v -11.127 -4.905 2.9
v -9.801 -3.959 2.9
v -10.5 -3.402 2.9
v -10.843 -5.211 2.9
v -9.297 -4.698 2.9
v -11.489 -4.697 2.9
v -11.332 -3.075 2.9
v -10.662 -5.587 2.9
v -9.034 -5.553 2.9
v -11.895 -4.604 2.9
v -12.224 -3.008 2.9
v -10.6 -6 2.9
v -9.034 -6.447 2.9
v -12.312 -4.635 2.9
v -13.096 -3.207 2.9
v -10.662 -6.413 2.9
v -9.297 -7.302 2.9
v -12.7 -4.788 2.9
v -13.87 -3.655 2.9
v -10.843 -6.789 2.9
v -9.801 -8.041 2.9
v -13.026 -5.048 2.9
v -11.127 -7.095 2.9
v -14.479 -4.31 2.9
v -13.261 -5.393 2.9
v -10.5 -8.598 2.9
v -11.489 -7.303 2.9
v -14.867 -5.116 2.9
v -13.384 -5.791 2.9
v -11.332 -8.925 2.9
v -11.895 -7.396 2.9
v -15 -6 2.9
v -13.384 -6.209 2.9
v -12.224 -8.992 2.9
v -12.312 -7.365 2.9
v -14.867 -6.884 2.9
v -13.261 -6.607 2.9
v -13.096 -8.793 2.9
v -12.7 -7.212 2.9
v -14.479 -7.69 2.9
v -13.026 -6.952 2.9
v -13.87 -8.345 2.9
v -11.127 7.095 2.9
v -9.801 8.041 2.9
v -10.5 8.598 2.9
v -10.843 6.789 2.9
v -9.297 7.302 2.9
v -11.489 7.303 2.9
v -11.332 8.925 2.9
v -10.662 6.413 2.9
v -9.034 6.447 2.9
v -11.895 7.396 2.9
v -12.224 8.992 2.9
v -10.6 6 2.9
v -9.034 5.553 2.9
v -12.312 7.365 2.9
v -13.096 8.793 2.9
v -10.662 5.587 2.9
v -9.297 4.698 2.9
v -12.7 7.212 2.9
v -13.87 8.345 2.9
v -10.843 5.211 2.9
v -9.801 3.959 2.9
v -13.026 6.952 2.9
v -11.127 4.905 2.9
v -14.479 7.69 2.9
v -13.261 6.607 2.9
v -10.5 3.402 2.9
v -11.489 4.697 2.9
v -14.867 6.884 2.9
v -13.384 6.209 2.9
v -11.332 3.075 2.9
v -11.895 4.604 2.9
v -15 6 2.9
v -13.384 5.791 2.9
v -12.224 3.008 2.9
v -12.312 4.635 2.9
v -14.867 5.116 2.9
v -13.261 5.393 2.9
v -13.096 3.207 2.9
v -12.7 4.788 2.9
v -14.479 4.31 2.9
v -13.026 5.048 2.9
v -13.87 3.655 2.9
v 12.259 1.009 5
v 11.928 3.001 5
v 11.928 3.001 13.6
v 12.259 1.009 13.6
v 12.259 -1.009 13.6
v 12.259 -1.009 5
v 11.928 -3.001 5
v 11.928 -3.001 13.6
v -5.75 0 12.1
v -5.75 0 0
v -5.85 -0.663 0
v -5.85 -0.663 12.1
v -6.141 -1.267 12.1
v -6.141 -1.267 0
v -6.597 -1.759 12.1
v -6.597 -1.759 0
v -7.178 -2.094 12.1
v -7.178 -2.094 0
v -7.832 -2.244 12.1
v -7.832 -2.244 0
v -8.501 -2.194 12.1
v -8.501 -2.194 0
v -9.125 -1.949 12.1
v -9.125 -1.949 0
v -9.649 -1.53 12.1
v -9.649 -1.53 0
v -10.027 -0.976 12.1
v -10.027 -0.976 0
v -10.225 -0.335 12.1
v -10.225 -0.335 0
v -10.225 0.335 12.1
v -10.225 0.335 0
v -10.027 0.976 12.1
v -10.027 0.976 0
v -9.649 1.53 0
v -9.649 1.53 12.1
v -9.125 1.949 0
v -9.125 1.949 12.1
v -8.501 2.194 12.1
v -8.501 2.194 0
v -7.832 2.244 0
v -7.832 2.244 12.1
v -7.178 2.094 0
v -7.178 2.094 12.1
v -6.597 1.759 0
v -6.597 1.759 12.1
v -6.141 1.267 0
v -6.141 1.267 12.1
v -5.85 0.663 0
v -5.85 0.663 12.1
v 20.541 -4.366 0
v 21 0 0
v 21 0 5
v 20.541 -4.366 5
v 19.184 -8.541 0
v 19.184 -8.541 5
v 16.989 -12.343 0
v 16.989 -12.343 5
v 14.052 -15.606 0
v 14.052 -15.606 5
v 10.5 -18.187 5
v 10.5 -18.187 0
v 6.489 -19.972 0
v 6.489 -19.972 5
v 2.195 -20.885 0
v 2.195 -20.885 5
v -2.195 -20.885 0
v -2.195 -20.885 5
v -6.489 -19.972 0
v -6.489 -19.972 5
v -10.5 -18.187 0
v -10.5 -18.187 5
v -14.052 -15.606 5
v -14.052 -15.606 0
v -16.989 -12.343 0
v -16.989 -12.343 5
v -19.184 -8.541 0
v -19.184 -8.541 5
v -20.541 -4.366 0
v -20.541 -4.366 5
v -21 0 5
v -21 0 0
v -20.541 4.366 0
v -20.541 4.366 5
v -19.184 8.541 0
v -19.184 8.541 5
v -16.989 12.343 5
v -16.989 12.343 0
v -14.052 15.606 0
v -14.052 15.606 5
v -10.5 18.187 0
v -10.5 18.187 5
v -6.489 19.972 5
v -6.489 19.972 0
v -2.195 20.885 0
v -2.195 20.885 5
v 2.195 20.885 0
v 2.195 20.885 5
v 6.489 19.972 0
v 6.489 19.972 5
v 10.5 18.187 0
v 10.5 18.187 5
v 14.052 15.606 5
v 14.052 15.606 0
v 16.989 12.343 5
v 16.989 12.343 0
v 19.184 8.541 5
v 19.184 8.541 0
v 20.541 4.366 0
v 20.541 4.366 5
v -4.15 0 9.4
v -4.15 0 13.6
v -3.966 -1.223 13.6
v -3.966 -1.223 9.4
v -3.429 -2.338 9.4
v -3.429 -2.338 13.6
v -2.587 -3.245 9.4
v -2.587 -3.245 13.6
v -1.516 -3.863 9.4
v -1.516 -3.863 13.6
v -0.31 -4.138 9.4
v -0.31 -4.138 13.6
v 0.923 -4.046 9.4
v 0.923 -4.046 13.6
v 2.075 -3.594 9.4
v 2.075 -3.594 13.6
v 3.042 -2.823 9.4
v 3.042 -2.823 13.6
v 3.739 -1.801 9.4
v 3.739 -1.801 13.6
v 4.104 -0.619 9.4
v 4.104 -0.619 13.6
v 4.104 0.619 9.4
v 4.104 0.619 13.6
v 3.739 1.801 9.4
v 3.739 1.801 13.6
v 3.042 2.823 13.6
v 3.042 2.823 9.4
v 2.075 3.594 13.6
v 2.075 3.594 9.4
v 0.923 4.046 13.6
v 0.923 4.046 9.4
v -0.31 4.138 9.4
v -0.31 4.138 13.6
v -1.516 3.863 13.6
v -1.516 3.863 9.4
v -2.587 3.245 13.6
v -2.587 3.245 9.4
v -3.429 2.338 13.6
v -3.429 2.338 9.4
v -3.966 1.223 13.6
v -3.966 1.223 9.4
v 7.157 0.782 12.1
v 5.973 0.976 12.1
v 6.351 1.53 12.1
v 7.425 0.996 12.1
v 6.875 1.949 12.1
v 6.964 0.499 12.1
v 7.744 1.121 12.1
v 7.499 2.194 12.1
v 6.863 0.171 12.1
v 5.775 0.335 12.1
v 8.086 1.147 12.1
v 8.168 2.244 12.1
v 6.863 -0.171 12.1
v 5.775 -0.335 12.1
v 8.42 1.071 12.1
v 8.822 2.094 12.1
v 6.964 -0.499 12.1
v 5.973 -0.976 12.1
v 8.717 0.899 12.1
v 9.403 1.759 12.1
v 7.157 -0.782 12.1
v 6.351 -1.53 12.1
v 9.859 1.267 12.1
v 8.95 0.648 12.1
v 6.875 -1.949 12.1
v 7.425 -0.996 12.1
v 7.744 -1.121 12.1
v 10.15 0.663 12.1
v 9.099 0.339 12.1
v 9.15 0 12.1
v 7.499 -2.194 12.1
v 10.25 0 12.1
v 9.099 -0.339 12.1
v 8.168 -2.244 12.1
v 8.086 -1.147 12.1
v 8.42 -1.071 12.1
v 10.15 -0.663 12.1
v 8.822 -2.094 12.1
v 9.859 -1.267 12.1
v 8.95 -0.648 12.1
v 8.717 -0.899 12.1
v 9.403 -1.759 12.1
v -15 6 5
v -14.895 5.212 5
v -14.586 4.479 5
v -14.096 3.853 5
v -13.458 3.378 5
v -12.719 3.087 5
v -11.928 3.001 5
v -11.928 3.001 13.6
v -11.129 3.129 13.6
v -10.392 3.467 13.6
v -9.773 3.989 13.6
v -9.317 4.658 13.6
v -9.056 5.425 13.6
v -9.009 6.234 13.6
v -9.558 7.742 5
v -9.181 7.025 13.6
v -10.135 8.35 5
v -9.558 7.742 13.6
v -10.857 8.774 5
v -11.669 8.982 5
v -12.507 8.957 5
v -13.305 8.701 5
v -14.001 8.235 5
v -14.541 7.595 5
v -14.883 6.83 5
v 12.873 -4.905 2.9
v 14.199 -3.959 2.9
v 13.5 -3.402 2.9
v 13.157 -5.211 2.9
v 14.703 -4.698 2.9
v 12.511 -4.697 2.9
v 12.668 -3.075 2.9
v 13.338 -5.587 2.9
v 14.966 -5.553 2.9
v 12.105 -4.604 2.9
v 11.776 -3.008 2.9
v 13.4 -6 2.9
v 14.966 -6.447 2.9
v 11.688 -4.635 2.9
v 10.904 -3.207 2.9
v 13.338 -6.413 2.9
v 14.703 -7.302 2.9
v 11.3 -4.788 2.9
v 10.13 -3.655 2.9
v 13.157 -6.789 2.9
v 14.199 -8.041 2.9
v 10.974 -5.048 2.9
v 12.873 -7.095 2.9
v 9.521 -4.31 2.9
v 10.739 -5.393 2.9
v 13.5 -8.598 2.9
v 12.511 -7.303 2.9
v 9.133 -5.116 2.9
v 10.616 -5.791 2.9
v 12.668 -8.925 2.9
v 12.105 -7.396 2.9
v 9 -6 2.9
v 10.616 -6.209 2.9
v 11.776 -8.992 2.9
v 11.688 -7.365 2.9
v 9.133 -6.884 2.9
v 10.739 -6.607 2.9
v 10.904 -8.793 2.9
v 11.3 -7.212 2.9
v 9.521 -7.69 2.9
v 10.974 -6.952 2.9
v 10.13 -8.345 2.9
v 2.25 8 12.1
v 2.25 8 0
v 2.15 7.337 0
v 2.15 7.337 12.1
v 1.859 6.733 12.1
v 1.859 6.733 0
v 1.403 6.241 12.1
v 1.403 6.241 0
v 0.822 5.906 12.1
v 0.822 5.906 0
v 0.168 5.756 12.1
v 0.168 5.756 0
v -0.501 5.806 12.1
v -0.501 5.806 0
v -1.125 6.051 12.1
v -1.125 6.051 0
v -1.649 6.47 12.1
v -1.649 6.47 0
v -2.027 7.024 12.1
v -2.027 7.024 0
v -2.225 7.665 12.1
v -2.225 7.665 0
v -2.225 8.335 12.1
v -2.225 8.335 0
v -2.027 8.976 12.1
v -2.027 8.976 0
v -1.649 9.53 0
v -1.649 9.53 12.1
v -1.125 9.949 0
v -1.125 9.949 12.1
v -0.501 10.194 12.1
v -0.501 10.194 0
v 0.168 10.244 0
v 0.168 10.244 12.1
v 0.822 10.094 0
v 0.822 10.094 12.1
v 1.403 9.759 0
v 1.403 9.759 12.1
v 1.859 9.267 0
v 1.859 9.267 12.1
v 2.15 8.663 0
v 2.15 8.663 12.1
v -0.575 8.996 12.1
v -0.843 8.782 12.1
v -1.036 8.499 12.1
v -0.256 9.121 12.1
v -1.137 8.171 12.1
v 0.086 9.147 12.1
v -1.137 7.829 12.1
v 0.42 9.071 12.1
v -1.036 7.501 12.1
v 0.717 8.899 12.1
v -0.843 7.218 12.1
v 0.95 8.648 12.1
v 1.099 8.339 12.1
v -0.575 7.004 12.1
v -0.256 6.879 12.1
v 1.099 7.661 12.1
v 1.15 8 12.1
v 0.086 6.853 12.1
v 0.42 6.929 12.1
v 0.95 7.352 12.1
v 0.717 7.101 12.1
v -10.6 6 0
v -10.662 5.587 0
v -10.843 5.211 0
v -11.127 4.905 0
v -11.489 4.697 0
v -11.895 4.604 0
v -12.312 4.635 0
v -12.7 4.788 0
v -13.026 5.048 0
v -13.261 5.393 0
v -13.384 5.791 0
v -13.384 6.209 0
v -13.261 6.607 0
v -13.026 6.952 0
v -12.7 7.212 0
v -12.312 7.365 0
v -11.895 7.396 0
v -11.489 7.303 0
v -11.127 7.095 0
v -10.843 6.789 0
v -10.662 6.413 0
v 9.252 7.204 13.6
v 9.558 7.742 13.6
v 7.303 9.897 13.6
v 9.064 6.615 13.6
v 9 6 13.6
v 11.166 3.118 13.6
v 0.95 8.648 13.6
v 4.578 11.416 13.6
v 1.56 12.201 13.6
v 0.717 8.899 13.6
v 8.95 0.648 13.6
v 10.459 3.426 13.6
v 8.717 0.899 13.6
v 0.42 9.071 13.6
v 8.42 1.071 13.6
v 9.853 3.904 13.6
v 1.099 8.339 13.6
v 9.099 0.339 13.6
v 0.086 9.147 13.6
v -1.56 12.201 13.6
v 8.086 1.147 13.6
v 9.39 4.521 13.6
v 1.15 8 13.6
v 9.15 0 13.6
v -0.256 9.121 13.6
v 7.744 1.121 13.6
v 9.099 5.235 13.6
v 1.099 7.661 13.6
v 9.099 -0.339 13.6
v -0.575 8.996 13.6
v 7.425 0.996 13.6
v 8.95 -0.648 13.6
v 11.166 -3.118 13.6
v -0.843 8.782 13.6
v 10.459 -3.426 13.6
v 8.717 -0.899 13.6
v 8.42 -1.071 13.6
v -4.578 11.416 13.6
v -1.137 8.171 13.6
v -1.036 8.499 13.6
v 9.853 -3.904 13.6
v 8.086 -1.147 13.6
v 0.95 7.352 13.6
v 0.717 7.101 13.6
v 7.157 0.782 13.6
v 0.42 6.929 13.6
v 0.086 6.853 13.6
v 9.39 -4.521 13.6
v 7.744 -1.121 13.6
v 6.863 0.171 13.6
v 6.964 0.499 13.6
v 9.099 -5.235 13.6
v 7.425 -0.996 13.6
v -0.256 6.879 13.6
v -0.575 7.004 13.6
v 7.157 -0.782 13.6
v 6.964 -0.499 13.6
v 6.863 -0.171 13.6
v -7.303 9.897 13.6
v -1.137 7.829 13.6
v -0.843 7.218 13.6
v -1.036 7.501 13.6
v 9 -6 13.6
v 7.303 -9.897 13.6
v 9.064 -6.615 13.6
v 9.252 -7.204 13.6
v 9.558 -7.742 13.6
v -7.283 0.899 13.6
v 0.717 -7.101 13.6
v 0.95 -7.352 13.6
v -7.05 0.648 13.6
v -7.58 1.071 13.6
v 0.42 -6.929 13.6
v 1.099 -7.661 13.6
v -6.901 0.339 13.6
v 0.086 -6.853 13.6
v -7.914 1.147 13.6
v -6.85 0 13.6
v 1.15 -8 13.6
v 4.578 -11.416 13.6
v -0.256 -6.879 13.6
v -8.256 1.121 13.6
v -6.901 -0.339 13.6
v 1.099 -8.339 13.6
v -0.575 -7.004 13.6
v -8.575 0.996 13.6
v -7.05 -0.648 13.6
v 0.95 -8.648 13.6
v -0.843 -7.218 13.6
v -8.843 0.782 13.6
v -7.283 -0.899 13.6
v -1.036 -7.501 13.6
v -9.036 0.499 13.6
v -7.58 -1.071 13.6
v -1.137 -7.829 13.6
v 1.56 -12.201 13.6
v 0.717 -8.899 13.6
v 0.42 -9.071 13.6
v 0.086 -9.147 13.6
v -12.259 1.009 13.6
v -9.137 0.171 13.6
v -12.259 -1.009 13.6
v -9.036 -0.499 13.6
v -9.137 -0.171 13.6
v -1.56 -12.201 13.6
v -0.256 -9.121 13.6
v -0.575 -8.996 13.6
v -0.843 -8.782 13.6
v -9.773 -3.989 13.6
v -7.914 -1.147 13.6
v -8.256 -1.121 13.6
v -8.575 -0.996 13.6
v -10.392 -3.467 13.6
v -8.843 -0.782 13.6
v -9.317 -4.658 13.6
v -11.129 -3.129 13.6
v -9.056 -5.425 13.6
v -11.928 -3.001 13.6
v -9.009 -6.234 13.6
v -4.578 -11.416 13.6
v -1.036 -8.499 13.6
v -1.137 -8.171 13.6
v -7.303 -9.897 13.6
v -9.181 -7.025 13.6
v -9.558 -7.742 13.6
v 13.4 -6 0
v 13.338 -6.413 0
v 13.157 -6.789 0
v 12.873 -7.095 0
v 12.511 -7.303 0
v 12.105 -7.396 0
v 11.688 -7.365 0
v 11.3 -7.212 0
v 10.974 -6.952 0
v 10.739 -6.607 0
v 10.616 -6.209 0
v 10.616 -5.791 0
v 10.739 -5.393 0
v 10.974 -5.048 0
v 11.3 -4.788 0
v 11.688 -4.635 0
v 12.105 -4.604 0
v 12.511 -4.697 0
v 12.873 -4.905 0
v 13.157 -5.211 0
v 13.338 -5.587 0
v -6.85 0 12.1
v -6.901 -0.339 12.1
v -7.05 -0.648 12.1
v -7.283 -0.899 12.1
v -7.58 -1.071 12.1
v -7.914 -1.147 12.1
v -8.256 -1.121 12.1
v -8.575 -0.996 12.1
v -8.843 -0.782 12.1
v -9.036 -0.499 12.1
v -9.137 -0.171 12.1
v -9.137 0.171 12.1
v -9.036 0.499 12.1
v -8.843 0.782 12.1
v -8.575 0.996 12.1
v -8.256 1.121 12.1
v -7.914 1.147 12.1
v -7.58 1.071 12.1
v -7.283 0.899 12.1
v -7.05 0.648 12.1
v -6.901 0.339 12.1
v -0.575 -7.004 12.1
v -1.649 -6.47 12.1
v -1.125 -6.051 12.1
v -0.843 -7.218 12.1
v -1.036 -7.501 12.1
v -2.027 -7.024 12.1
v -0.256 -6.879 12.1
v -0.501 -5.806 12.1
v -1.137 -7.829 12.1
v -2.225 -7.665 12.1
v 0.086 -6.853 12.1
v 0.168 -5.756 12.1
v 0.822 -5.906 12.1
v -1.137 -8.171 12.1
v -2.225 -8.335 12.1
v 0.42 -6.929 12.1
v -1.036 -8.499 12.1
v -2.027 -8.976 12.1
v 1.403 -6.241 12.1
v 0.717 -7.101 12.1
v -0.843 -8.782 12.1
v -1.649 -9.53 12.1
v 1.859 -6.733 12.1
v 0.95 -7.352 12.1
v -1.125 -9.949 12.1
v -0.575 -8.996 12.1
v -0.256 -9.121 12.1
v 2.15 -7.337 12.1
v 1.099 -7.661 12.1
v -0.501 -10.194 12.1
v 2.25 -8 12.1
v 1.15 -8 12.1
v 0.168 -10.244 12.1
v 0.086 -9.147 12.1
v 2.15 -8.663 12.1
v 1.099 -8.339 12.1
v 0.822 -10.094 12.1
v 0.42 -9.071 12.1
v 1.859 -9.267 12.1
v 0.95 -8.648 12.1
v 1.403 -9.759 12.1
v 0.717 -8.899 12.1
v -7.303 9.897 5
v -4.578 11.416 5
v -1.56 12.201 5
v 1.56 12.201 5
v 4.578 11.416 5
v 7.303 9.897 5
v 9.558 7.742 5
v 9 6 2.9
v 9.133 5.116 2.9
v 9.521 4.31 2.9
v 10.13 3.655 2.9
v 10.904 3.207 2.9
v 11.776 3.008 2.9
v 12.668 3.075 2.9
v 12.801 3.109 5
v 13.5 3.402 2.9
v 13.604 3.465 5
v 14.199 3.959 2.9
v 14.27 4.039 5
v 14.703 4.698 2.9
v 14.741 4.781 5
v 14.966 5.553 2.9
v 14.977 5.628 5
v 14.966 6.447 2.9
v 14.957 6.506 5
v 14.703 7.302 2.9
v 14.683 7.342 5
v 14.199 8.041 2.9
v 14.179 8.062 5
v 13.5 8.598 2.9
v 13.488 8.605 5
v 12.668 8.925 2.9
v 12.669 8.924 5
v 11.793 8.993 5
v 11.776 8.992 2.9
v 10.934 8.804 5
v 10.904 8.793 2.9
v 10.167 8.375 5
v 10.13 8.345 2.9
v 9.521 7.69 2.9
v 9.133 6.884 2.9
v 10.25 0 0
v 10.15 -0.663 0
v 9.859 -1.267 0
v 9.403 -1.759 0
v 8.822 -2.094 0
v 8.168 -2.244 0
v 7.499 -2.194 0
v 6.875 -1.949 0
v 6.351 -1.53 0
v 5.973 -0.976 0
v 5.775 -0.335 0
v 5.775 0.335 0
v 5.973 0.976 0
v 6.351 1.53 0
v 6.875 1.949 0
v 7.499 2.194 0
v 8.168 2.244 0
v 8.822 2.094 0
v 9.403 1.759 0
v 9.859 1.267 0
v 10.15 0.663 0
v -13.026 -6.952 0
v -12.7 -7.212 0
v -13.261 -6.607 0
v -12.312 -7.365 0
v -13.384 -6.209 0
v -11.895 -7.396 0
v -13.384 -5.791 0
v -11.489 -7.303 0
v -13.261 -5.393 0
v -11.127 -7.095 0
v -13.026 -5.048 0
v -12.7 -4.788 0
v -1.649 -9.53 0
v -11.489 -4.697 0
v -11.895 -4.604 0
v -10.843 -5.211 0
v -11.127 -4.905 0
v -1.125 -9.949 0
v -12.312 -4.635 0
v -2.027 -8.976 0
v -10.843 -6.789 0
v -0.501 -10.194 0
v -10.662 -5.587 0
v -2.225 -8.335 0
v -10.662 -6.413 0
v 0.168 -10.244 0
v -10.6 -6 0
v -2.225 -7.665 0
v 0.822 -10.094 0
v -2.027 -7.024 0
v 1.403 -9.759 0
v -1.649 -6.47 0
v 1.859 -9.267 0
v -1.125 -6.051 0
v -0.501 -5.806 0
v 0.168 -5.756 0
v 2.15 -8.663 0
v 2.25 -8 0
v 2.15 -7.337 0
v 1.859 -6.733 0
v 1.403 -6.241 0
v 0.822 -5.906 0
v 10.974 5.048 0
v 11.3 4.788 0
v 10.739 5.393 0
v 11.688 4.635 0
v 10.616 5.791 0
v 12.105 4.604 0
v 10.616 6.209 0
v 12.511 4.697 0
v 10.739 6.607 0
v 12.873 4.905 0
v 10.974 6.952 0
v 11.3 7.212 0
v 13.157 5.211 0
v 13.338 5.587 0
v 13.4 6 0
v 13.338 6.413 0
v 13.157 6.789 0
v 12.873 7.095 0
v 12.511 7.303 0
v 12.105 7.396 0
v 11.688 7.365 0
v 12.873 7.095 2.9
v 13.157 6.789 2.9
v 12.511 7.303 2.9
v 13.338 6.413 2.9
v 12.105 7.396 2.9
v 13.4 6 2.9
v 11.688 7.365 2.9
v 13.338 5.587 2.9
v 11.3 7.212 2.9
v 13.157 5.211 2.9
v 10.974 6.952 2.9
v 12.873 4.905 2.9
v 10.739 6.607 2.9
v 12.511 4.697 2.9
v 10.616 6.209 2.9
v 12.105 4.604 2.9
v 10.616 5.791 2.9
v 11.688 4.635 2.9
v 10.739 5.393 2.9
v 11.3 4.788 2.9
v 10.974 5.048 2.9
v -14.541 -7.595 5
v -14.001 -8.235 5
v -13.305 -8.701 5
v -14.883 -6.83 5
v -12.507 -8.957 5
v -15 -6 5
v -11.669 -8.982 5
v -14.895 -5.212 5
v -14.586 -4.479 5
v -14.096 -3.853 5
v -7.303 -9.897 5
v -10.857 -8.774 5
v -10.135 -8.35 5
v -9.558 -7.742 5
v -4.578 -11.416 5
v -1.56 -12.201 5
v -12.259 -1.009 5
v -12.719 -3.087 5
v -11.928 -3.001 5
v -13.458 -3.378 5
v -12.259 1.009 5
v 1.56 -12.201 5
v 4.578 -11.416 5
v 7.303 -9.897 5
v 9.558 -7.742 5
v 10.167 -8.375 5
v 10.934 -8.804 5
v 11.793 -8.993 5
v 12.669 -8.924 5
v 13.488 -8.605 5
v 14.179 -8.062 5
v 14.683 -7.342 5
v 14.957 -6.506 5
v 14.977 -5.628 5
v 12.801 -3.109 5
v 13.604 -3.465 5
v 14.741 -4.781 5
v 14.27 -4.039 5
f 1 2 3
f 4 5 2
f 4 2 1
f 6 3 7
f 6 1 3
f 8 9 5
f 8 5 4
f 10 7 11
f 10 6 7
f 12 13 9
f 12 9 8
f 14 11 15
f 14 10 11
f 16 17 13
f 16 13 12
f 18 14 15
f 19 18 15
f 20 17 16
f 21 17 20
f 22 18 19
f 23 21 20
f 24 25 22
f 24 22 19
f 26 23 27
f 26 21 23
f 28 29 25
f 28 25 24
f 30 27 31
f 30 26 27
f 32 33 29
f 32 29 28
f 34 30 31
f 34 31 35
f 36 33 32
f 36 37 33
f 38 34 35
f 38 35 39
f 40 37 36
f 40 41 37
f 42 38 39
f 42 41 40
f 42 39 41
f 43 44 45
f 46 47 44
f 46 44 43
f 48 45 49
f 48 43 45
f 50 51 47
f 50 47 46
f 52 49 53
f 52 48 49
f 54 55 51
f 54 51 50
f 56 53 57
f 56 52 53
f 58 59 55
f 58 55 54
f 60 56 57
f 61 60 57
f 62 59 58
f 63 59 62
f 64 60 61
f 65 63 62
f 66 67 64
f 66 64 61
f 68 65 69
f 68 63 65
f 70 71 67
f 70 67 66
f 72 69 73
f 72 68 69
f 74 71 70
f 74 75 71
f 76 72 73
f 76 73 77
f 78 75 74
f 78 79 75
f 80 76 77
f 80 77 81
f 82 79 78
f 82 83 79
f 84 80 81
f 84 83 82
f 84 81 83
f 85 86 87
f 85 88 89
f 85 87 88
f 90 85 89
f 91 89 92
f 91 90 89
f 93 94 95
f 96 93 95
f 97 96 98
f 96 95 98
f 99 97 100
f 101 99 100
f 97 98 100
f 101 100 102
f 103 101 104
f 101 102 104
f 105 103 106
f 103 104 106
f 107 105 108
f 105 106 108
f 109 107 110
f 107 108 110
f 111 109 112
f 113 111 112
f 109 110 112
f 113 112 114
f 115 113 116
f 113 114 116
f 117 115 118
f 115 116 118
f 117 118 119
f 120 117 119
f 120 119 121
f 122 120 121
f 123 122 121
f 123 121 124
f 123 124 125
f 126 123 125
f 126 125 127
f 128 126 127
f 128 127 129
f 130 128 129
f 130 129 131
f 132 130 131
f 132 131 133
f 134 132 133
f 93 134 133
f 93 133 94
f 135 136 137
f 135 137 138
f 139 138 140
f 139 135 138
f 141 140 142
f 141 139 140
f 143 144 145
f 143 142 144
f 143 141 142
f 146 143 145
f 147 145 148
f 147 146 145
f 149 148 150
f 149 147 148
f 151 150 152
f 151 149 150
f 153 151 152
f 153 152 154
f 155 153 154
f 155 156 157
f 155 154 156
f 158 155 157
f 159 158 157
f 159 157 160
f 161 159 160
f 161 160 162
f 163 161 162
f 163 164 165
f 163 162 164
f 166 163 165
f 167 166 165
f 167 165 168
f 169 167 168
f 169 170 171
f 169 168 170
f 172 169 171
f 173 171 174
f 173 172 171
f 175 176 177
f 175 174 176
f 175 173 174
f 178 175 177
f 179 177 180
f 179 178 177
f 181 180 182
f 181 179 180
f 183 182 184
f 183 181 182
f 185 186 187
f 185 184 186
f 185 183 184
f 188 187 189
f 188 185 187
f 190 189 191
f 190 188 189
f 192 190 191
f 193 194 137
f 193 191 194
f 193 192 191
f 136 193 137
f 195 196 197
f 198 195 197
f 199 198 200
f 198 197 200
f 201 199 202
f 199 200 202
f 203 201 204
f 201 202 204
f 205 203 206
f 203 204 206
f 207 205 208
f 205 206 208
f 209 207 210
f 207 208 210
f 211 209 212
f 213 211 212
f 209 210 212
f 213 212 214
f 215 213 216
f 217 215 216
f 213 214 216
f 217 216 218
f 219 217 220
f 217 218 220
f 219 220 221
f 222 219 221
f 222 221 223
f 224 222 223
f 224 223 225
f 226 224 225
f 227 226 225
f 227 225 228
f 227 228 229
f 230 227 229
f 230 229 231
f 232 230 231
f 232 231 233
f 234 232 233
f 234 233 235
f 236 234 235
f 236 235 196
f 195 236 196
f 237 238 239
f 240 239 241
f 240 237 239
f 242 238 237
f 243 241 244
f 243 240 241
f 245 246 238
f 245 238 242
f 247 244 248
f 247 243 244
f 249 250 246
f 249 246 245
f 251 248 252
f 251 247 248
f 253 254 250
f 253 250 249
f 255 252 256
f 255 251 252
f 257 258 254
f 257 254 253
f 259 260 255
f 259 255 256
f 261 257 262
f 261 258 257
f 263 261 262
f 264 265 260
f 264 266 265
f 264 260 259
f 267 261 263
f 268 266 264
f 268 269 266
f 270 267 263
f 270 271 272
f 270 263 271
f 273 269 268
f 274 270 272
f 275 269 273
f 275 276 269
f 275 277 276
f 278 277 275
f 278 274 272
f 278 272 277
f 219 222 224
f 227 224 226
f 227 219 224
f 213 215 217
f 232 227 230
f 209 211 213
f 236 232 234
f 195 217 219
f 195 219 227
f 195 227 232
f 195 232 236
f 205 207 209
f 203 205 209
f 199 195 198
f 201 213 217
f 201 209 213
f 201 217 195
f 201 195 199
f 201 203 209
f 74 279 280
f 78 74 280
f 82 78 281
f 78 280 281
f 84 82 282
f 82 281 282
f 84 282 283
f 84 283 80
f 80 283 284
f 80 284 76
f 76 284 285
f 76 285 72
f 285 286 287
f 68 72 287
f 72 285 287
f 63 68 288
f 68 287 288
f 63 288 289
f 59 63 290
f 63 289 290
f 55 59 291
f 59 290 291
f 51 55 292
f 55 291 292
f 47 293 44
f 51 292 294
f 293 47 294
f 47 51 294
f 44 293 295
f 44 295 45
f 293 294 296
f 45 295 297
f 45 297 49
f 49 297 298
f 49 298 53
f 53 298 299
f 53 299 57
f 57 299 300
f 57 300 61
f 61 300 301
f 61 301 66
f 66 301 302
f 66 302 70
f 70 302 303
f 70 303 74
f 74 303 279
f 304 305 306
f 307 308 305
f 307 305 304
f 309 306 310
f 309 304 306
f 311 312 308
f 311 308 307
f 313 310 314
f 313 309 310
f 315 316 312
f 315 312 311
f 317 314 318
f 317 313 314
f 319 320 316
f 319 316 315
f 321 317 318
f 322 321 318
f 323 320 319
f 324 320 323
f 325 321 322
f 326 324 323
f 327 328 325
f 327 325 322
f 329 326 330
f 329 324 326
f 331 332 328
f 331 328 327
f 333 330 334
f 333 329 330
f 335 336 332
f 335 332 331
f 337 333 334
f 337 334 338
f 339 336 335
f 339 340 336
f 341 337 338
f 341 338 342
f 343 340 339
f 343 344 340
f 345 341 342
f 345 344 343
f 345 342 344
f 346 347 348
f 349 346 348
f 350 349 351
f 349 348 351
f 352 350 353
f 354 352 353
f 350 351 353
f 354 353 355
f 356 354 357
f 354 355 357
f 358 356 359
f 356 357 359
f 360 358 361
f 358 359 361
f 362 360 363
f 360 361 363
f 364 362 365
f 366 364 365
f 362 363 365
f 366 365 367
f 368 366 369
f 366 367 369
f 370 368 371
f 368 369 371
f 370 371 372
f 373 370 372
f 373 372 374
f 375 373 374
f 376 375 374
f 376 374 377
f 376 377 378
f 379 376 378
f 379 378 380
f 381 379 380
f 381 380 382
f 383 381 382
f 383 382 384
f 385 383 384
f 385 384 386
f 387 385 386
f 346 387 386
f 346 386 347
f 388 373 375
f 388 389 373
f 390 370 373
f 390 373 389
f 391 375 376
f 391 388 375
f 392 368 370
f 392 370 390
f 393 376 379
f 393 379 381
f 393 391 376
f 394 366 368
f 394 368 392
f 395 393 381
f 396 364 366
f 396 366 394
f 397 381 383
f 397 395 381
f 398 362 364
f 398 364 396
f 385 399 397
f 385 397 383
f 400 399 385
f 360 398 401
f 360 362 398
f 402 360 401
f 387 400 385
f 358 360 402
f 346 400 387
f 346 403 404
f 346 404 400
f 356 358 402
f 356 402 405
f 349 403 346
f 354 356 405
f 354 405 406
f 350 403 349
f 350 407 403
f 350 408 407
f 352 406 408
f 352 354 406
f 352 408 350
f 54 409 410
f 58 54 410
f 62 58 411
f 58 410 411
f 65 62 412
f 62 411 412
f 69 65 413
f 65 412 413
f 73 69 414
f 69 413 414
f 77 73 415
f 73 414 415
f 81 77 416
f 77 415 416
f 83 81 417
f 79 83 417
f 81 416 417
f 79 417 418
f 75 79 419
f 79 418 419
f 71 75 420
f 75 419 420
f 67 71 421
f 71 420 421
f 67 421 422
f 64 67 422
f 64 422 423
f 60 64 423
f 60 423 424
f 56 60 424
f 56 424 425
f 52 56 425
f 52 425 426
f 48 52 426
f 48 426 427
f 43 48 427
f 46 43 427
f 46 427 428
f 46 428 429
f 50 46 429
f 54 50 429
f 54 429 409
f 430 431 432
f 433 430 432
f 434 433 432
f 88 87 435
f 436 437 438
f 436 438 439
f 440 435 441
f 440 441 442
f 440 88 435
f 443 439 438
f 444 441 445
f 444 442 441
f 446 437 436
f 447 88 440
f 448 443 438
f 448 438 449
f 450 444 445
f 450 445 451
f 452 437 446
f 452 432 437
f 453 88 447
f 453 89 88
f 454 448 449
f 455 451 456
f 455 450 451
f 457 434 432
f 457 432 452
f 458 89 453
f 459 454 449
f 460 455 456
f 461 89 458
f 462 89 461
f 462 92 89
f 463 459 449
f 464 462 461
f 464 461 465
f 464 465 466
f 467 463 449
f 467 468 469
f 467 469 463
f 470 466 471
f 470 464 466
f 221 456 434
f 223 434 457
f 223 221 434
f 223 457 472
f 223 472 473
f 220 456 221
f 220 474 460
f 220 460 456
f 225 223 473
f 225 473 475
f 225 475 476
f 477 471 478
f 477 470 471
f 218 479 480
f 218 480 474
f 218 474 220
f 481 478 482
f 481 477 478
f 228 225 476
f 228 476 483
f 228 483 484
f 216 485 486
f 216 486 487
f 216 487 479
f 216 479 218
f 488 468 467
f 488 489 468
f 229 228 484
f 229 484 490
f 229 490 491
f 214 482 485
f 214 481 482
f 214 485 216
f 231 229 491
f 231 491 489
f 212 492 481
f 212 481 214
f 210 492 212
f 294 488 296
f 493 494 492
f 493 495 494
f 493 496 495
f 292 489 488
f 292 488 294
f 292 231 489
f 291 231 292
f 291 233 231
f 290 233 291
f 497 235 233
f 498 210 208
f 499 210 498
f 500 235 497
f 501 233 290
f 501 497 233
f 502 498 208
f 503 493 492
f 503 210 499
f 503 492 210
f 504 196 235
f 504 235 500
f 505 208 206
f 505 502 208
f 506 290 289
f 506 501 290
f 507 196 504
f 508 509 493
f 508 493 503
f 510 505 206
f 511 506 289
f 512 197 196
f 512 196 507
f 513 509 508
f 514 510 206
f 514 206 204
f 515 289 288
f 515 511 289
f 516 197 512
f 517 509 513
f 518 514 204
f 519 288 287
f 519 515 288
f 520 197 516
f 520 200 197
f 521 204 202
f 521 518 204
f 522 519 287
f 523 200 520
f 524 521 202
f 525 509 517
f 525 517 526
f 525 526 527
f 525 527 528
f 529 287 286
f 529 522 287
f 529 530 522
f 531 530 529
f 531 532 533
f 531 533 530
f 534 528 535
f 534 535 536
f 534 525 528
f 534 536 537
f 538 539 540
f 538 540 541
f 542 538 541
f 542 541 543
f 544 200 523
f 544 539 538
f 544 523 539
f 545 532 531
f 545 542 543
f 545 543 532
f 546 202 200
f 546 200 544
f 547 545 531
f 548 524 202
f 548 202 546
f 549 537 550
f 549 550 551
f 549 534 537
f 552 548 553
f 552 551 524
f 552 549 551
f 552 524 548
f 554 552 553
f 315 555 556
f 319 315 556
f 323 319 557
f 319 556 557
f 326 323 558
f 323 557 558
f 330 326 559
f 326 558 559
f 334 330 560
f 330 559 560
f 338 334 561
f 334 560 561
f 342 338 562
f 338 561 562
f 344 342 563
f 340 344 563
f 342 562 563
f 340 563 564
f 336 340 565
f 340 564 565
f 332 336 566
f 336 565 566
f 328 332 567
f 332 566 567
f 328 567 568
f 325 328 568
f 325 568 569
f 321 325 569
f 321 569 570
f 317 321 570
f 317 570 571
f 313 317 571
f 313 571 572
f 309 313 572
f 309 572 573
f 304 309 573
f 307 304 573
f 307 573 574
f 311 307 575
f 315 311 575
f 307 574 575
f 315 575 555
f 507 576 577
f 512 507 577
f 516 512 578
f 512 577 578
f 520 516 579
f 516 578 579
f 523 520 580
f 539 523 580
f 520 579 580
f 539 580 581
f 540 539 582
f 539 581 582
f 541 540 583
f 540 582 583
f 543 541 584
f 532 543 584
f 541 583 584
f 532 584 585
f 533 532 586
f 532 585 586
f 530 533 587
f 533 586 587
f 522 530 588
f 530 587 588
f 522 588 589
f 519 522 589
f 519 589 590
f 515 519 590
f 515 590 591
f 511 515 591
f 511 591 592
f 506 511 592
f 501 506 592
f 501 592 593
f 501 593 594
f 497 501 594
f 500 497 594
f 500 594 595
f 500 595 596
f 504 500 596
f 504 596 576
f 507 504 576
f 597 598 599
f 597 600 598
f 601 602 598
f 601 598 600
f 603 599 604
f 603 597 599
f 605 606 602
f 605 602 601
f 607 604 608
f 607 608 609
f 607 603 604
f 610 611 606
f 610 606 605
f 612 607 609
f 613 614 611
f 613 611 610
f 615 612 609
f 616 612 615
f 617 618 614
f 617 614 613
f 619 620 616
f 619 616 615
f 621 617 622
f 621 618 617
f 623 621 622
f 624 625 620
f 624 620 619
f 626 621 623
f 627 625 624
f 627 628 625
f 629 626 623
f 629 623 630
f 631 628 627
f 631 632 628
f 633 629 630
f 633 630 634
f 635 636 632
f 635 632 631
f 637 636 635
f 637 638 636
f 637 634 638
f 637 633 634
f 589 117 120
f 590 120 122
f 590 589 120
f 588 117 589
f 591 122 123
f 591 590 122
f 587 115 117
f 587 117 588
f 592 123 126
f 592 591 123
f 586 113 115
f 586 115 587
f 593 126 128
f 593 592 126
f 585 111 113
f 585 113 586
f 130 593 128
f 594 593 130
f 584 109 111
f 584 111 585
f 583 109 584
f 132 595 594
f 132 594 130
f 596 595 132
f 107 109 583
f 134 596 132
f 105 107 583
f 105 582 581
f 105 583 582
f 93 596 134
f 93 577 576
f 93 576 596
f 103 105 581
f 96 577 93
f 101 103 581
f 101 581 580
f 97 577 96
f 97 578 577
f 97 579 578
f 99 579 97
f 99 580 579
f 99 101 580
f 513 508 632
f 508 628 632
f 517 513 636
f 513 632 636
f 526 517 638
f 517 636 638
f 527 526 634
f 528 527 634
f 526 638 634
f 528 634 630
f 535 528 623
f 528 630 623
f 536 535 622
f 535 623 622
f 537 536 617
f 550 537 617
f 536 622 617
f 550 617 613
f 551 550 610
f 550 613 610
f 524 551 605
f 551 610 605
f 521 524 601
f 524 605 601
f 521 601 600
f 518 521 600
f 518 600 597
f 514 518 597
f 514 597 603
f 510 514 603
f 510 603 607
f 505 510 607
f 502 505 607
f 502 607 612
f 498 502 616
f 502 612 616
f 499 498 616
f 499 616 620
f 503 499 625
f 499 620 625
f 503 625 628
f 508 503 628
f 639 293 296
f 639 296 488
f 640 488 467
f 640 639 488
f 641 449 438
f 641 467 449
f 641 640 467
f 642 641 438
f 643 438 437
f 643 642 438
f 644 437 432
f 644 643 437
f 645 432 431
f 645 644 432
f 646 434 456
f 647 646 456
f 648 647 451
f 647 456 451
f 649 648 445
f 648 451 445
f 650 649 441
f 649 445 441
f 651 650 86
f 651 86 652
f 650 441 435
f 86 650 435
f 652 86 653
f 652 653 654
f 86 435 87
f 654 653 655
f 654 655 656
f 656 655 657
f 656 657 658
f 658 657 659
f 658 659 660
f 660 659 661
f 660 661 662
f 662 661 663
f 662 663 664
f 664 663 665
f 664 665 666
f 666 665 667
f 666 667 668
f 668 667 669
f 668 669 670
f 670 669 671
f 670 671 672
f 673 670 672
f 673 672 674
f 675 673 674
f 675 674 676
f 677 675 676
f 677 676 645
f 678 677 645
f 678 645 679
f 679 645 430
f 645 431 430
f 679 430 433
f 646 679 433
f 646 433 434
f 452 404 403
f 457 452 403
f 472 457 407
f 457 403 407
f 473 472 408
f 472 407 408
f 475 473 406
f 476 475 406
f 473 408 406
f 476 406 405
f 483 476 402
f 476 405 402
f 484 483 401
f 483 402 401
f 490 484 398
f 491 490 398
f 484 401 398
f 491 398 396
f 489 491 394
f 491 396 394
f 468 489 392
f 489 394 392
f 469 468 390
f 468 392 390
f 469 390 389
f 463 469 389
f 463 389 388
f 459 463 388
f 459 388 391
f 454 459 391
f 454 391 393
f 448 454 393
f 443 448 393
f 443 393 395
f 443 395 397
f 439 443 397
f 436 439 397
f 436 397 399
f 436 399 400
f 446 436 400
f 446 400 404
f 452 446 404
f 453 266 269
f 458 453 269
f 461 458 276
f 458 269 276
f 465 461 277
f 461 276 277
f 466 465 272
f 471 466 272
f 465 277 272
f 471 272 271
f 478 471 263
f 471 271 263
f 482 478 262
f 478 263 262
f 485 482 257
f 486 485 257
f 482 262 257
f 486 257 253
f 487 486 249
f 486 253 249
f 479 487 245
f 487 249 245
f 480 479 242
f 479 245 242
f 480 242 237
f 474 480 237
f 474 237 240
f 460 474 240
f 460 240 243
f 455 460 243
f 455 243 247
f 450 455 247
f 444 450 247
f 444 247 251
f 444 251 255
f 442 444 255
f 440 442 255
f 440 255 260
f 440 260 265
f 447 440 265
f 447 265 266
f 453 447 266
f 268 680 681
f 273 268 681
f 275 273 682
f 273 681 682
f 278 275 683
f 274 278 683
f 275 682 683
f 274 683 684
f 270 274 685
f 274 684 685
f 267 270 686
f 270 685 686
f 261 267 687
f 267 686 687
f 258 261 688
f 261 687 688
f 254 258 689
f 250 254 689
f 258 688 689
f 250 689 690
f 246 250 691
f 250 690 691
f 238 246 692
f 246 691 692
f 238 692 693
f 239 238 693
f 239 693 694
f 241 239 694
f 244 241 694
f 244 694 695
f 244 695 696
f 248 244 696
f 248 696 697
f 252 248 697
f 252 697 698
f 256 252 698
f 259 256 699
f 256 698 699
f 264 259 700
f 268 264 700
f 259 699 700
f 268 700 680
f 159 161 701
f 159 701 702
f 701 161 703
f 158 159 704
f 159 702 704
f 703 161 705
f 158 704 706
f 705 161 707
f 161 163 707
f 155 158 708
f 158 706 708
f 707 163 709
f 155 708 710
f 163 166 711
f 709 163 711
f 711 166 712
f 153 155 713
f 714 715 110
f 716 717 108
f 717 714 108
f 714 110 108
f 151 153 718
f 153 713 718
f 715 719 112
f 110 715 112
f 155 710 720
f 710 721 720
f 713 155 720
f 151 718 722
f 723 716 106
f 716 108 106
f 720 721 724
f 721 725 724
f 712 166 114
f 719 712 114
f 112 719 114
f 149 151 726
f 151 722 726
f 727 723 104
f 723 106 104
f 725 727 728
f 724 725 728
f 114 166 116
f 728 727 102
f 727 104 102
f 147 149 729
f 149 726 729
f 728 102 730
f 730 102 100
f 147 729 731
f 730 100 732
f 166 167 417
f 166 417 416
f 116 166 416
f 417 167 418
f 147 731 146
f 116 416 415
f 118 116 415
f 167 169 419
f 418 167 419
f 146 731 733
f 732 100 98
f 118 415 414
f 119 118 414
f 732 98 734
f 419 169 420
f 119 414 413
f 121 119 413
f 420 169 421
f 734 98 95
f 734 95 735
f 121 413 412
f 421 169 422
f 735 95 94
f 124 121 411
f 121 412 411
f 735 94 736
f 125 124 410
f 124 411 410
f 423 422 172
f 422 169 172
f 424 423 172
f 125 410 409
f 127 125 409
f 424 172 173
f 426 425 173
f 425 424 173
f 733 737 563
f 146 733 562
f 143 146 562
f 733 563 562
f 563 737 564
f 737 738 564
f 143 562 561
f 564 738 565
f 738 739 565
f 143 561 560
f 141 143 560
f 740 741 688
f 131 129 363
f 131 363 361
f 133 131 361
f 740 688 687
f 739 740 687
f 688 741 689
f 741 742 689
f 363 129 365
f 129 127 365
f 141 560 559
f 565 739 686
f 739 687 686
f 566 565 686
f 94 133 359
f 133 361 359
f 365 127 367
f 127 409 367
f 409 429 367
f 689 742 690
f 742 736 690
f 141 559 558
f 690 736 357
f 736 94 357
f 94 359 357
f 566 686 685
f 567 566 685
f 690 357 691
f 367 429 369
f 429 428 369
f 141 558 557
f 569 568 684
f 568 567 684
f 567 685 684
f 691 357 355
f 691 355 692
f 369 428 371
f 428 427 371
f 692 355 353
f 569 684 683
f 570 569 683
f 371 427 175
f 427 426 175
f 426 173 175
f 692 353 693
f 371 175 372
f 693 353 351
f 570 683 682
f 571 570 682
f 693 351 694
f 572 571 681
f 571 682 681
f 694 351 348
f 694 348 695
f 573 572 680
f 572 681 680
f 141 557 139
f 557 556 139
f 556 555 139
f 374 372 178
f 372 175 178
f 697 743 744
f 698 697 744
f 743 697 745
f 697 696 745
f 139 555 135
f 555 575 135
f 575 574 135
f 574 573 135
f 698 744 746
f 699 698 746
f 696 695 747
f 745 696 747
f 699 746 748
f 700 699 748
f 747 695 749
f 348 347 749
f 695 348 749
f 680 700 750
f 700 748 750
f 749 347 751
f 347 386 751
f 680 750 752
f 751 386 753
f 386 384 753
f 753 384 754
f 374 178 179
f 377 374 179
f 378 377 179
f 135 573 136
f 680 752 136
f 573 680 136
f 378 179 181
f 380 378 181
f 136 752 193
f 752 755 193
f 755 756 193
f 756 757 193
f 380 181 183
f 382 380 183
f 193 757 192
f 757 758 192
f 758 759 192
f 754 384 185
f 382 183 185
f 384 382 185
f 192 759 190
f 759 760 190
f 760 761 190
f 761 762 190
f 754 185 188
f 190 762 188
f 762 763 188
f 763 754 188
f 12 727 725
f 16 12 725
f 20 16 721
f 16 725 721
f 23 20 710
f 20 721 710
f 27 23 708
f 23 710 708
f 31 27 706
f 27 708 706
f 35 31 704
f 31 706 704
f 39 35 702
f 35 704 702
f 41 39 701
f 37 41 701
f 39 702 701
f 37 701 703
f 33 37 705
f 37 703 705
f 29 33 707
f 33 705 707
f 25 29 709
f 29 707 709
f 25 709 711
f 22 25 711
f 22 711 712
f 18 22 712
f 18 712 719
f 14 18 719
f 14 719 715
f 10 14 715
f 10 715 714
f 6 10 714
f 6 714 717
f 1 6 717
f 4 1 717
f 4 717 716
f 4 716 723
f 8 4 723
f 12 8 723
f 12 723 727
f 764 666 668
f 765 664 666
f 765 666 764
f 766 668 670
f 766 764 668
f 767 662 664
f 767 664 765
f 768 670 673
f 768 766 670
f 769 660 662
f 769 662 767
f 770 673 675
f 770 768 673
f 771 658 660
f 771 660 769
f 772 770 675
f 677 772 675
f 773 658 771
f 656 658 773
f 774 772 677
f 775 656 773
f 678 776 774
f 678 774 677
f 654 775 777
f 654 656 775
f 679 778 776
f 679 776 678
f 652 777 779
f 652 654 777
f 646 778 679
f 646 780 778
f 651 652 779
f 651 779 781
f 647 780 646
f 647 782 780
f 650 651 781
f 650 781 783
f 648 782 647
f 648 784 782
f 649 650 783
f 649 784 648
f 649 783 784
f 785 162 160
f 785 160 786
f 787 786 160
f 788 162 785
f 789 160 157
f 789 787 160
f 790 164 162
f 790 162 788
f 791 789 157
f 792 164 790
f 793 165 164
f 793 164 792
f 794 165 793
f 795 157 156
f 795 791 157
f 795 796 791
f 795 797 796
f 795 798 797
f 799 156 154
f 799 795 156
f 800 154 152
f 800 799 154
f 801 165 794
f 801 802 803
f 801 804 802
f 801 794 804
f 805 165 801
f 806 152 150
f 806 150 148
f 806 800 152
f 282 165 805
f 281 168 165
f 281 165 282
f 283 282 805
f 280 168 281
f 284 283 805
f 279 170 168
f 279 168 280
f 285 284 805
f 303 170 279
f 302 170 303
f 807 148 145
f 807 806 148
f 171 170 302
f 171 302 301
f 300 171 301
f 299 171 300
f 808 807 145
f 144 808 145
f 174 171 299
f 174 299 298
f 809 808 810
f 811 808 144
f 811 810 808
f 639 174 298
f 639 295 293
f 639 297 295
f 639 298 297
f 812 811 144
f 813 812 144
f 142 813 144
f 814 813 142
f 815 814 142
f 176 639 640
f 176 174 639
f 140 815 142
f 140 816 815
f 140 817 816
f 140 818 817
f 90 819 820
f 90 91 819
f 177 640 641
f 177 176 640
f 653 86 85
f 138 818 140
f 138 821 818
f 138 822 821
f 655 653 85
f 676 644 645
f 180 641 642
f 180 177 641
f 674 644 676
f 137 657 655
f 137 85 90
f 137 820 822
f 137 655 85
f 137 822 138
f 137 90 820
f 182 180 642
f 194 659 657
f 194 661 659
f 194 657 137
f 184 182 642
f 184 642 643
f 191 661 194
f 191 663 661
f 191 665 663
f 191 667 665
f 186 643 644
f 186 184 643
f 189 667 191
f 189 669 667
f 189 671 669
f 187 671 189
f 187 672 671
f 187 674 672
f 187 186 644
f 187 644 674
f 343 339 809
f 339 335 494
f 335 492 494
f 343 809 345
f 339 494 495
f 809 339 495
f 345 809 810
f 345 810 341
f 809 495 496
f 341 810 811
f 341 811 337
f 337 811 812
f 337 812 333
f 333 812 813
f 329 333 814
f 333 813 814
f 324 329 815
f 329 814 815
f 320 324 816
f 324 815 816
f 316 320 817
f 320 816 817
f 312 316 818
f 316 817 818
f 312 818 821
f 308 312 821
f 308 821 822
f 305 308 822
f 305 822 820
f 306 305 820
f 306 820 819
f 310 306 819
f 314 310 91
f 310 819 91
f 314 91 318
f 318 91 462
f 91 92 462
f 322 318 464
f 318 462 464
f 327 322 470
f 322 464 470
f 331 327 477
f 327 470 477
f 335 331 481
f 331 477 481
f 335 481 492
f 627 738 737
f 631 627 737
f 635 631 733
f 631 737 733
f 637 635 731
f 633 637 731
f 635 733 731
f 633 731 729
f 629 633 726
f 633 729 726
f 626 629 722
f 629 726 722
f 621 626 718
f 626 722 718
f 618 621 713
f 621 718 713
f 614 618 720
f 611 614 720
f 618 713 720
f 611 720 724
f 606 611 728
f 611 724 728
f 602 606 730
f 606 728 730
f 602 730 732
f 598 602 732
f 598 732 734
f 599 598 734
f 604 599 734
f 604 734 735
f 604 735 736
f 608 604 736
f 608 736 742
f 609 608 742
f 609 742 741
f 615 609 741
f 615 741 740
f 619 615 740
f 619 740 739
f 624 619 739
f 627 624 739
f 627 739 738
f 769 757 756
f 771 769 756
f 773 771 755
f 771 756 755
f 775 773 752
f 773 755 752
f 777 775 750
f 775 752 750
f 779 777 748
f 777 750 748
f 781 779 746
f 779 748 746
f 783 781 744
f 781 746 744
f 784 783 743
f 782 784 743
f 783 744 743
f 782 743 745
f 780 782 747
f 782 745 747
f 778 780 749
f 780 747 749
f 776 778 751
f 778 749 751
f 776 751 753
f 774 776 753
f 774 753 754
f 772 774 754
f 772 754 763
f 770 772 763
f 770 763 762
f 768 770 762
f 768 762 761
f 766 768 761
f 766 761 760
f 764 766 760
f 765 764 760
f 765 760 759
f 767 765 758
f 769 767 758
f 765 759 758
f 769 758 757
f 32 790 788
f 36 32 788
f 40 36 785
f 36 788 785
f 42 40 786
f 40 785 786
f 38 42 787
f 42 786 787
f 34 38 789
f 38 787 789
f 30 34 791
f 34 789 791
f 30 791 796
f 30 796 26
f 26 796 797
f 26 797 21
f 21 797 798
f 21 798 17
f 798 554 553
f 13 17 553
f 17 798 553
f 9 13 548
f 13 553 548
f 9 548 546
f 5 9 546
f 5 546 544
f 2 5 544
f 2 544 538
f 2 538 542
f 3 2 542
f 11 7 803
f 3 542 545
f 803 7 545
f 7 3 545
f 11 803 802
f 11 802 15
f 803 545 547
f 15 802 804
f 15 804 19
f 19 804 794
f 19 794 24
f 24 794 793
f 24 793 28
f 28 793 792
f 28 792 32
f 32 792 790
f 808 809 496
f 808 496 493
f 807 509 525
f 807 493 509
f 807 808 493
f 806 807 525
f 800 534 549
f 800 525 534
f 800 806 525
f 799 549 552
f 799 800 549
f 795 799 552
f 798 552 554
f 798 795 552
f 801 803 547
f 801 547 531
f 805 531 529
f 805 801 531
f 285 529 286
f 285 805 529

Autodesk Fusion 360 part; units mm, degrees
sketch "スケッチ1" plane through (0, 0, 0) normal (0, 0, 1) x (1, 0, 0)
  circle A0 centre (0, 0) radius 21
  dimension "d1" = 42
extrude "押し出し1" add sketch "スケッチ1" along normal blind 5
sketch "スケッチ2" plane through (0, 0, 5) normal (0, 0, 1) x (-1, 0, 0)
  circle A0 centre (0, 0) radius 21
  circle A1 centre (0, 0) radius 12.3
  dimension "d4" = 24.6
extrude "押し出し2" add sketch "スケッチ2" along normal blind 8.6 contours A1
sketch "スケッチ3" plane through (0, 0, 13.6) normal (0, 0, 1) x (-1, 0, 0)
  circle A0 centre (0, 0) radius 12.3
  circle A1 centre (0, 0) radius 4.15
  dimension "d7" = 8.3
extrude "押し出し3" cut sketch "スケッチ3" against normal blind 4.2 contours A1
sketch "スケッチ4" plane through (0, 0, 0) normal (0, 0, -1) x (1, 0, 0)
  circle A0 centre (0, 0) radius 21
  circle A1 centre (0, 0) radius 8
  circle A2 centre (0, -8) radius 1.15
  circle A3 centre (8, 0) radius 1.15
  circle A4 centre (0, 8) radius 1.15
  circle A5 centre (-8, 0) radius 1.15
  dimension "d10" = 16
  dimension "d11" = 2.3
  dimension "d12" = 2.3
  dimension "d13" = 2.3
  dimension "d14" = 2.3
extrude "押し出し4" cut sketch "スケッチ4" against normal through all contours A1 A3 | A1 A3 | A1 A4 | A1 A4 | A1 A2 | A1 A2 | A1 A5 | A1 A5
sketch "スケッチ5" plane through (0, 0, 0) normal (0, 0, -1) x (1, 0, 0)
  circle A0 centre (8, 0) radius 1.15
  circle A1 centre (0, 8) radius 1.15
  circle A2 centre (0, -8) radius 1.15
  circle A3 centre (-8, 0) radius 1.15
  circle A4 centre (0, 0) radius 21
  line L0 (12, -6) -> (-12, -6)
  line L1 (-12, -6) -> (-12, 6)
  line L2 (-12, 6) -> (12, 6)
  line L3 (12, 6) -> (12, -6)
  circle A5 centre (12, -6) radius 1.4
  circle A6 centre (-12, -6) radius 1.4
  circle A7 centre (12, 6) radius 1.4
  circle A8 centre (-12, 6) radius 1.4
  dimension "d16" = 24
  dimension "d17" = 12
  dimension "d18" = 12
  dimension "d19" = 6
  dimension "d20" = 2.8
  dimension "d21" = 2.8
  dimension "d22" = 2.8
  dimension "d23" = 2.8
extrude "押し出し5" cut sketch "スケッチ5" against normal through all contours L0 L1 A6 | L0 L1 A6 | L0 L3 A5 | L0 L3 A5 | L1 L2 A8 | L1 L2 A8 | L2 L3 A7 | L2 L3 A7
sketch "スケッチ6" plane through (0, 0, 0) normal (0, 0, -1) x (1, 0, 0)
  circle A0 centre (0, 0) radius 21
  circle A1 centre (-8, 0) radius 1.15
  circle A2 centre (0, -8) radius 1.15
  circle A3 centre (0, 8) radius 1.15
  circle A4 centre (8, 0) radius 1.15
  circle A5 centre (-12, 6) radius 1.4
  circle A6 centre (12, -6) radius 1.4
  circle A7 centre (-12, -6) radius 1.4
  circle A8 centre (12, 6) radius 1.4
  circle A9 centre (-8, 0) radius 2.25
  circle A10 centre (0, 8) radius 2.25
  circle A11 centre (8, 0) radius 2.25
  circle A12 centre (0, -8) radius 2.25
  dimension "d25" = 4.5
  dimension "d26" = 4.5
  dimension "d27" = 4.5
  dimension "d28" = 4.5
extrude "押し出し6" cut sketch "スケッチ6" against normal blind 12.1 contours A9 | A10 | A11 | A12
sketch "スケッチ7" plane through (0, 0, 13.6) normal (0, 0, 1) x (-1, 0, 0)
  circle A0 centre (12, -6) radius 3
  circle A1 centre (12, 6) radius 3
  circle A2 centre (-12, -6) radius 3
  circle A3 centre (-12, 6) radius 3
  dimension "d31" = 6
  dimension "d32" = 6
  dimension "d33" = 6
  dimension "d34" = 6
extrude "押し出し7" cut sketch "スケッチ7" against normal blind 10.7
equation "d18 = d16 / 2"
equation "d19 = d17 / 2"
